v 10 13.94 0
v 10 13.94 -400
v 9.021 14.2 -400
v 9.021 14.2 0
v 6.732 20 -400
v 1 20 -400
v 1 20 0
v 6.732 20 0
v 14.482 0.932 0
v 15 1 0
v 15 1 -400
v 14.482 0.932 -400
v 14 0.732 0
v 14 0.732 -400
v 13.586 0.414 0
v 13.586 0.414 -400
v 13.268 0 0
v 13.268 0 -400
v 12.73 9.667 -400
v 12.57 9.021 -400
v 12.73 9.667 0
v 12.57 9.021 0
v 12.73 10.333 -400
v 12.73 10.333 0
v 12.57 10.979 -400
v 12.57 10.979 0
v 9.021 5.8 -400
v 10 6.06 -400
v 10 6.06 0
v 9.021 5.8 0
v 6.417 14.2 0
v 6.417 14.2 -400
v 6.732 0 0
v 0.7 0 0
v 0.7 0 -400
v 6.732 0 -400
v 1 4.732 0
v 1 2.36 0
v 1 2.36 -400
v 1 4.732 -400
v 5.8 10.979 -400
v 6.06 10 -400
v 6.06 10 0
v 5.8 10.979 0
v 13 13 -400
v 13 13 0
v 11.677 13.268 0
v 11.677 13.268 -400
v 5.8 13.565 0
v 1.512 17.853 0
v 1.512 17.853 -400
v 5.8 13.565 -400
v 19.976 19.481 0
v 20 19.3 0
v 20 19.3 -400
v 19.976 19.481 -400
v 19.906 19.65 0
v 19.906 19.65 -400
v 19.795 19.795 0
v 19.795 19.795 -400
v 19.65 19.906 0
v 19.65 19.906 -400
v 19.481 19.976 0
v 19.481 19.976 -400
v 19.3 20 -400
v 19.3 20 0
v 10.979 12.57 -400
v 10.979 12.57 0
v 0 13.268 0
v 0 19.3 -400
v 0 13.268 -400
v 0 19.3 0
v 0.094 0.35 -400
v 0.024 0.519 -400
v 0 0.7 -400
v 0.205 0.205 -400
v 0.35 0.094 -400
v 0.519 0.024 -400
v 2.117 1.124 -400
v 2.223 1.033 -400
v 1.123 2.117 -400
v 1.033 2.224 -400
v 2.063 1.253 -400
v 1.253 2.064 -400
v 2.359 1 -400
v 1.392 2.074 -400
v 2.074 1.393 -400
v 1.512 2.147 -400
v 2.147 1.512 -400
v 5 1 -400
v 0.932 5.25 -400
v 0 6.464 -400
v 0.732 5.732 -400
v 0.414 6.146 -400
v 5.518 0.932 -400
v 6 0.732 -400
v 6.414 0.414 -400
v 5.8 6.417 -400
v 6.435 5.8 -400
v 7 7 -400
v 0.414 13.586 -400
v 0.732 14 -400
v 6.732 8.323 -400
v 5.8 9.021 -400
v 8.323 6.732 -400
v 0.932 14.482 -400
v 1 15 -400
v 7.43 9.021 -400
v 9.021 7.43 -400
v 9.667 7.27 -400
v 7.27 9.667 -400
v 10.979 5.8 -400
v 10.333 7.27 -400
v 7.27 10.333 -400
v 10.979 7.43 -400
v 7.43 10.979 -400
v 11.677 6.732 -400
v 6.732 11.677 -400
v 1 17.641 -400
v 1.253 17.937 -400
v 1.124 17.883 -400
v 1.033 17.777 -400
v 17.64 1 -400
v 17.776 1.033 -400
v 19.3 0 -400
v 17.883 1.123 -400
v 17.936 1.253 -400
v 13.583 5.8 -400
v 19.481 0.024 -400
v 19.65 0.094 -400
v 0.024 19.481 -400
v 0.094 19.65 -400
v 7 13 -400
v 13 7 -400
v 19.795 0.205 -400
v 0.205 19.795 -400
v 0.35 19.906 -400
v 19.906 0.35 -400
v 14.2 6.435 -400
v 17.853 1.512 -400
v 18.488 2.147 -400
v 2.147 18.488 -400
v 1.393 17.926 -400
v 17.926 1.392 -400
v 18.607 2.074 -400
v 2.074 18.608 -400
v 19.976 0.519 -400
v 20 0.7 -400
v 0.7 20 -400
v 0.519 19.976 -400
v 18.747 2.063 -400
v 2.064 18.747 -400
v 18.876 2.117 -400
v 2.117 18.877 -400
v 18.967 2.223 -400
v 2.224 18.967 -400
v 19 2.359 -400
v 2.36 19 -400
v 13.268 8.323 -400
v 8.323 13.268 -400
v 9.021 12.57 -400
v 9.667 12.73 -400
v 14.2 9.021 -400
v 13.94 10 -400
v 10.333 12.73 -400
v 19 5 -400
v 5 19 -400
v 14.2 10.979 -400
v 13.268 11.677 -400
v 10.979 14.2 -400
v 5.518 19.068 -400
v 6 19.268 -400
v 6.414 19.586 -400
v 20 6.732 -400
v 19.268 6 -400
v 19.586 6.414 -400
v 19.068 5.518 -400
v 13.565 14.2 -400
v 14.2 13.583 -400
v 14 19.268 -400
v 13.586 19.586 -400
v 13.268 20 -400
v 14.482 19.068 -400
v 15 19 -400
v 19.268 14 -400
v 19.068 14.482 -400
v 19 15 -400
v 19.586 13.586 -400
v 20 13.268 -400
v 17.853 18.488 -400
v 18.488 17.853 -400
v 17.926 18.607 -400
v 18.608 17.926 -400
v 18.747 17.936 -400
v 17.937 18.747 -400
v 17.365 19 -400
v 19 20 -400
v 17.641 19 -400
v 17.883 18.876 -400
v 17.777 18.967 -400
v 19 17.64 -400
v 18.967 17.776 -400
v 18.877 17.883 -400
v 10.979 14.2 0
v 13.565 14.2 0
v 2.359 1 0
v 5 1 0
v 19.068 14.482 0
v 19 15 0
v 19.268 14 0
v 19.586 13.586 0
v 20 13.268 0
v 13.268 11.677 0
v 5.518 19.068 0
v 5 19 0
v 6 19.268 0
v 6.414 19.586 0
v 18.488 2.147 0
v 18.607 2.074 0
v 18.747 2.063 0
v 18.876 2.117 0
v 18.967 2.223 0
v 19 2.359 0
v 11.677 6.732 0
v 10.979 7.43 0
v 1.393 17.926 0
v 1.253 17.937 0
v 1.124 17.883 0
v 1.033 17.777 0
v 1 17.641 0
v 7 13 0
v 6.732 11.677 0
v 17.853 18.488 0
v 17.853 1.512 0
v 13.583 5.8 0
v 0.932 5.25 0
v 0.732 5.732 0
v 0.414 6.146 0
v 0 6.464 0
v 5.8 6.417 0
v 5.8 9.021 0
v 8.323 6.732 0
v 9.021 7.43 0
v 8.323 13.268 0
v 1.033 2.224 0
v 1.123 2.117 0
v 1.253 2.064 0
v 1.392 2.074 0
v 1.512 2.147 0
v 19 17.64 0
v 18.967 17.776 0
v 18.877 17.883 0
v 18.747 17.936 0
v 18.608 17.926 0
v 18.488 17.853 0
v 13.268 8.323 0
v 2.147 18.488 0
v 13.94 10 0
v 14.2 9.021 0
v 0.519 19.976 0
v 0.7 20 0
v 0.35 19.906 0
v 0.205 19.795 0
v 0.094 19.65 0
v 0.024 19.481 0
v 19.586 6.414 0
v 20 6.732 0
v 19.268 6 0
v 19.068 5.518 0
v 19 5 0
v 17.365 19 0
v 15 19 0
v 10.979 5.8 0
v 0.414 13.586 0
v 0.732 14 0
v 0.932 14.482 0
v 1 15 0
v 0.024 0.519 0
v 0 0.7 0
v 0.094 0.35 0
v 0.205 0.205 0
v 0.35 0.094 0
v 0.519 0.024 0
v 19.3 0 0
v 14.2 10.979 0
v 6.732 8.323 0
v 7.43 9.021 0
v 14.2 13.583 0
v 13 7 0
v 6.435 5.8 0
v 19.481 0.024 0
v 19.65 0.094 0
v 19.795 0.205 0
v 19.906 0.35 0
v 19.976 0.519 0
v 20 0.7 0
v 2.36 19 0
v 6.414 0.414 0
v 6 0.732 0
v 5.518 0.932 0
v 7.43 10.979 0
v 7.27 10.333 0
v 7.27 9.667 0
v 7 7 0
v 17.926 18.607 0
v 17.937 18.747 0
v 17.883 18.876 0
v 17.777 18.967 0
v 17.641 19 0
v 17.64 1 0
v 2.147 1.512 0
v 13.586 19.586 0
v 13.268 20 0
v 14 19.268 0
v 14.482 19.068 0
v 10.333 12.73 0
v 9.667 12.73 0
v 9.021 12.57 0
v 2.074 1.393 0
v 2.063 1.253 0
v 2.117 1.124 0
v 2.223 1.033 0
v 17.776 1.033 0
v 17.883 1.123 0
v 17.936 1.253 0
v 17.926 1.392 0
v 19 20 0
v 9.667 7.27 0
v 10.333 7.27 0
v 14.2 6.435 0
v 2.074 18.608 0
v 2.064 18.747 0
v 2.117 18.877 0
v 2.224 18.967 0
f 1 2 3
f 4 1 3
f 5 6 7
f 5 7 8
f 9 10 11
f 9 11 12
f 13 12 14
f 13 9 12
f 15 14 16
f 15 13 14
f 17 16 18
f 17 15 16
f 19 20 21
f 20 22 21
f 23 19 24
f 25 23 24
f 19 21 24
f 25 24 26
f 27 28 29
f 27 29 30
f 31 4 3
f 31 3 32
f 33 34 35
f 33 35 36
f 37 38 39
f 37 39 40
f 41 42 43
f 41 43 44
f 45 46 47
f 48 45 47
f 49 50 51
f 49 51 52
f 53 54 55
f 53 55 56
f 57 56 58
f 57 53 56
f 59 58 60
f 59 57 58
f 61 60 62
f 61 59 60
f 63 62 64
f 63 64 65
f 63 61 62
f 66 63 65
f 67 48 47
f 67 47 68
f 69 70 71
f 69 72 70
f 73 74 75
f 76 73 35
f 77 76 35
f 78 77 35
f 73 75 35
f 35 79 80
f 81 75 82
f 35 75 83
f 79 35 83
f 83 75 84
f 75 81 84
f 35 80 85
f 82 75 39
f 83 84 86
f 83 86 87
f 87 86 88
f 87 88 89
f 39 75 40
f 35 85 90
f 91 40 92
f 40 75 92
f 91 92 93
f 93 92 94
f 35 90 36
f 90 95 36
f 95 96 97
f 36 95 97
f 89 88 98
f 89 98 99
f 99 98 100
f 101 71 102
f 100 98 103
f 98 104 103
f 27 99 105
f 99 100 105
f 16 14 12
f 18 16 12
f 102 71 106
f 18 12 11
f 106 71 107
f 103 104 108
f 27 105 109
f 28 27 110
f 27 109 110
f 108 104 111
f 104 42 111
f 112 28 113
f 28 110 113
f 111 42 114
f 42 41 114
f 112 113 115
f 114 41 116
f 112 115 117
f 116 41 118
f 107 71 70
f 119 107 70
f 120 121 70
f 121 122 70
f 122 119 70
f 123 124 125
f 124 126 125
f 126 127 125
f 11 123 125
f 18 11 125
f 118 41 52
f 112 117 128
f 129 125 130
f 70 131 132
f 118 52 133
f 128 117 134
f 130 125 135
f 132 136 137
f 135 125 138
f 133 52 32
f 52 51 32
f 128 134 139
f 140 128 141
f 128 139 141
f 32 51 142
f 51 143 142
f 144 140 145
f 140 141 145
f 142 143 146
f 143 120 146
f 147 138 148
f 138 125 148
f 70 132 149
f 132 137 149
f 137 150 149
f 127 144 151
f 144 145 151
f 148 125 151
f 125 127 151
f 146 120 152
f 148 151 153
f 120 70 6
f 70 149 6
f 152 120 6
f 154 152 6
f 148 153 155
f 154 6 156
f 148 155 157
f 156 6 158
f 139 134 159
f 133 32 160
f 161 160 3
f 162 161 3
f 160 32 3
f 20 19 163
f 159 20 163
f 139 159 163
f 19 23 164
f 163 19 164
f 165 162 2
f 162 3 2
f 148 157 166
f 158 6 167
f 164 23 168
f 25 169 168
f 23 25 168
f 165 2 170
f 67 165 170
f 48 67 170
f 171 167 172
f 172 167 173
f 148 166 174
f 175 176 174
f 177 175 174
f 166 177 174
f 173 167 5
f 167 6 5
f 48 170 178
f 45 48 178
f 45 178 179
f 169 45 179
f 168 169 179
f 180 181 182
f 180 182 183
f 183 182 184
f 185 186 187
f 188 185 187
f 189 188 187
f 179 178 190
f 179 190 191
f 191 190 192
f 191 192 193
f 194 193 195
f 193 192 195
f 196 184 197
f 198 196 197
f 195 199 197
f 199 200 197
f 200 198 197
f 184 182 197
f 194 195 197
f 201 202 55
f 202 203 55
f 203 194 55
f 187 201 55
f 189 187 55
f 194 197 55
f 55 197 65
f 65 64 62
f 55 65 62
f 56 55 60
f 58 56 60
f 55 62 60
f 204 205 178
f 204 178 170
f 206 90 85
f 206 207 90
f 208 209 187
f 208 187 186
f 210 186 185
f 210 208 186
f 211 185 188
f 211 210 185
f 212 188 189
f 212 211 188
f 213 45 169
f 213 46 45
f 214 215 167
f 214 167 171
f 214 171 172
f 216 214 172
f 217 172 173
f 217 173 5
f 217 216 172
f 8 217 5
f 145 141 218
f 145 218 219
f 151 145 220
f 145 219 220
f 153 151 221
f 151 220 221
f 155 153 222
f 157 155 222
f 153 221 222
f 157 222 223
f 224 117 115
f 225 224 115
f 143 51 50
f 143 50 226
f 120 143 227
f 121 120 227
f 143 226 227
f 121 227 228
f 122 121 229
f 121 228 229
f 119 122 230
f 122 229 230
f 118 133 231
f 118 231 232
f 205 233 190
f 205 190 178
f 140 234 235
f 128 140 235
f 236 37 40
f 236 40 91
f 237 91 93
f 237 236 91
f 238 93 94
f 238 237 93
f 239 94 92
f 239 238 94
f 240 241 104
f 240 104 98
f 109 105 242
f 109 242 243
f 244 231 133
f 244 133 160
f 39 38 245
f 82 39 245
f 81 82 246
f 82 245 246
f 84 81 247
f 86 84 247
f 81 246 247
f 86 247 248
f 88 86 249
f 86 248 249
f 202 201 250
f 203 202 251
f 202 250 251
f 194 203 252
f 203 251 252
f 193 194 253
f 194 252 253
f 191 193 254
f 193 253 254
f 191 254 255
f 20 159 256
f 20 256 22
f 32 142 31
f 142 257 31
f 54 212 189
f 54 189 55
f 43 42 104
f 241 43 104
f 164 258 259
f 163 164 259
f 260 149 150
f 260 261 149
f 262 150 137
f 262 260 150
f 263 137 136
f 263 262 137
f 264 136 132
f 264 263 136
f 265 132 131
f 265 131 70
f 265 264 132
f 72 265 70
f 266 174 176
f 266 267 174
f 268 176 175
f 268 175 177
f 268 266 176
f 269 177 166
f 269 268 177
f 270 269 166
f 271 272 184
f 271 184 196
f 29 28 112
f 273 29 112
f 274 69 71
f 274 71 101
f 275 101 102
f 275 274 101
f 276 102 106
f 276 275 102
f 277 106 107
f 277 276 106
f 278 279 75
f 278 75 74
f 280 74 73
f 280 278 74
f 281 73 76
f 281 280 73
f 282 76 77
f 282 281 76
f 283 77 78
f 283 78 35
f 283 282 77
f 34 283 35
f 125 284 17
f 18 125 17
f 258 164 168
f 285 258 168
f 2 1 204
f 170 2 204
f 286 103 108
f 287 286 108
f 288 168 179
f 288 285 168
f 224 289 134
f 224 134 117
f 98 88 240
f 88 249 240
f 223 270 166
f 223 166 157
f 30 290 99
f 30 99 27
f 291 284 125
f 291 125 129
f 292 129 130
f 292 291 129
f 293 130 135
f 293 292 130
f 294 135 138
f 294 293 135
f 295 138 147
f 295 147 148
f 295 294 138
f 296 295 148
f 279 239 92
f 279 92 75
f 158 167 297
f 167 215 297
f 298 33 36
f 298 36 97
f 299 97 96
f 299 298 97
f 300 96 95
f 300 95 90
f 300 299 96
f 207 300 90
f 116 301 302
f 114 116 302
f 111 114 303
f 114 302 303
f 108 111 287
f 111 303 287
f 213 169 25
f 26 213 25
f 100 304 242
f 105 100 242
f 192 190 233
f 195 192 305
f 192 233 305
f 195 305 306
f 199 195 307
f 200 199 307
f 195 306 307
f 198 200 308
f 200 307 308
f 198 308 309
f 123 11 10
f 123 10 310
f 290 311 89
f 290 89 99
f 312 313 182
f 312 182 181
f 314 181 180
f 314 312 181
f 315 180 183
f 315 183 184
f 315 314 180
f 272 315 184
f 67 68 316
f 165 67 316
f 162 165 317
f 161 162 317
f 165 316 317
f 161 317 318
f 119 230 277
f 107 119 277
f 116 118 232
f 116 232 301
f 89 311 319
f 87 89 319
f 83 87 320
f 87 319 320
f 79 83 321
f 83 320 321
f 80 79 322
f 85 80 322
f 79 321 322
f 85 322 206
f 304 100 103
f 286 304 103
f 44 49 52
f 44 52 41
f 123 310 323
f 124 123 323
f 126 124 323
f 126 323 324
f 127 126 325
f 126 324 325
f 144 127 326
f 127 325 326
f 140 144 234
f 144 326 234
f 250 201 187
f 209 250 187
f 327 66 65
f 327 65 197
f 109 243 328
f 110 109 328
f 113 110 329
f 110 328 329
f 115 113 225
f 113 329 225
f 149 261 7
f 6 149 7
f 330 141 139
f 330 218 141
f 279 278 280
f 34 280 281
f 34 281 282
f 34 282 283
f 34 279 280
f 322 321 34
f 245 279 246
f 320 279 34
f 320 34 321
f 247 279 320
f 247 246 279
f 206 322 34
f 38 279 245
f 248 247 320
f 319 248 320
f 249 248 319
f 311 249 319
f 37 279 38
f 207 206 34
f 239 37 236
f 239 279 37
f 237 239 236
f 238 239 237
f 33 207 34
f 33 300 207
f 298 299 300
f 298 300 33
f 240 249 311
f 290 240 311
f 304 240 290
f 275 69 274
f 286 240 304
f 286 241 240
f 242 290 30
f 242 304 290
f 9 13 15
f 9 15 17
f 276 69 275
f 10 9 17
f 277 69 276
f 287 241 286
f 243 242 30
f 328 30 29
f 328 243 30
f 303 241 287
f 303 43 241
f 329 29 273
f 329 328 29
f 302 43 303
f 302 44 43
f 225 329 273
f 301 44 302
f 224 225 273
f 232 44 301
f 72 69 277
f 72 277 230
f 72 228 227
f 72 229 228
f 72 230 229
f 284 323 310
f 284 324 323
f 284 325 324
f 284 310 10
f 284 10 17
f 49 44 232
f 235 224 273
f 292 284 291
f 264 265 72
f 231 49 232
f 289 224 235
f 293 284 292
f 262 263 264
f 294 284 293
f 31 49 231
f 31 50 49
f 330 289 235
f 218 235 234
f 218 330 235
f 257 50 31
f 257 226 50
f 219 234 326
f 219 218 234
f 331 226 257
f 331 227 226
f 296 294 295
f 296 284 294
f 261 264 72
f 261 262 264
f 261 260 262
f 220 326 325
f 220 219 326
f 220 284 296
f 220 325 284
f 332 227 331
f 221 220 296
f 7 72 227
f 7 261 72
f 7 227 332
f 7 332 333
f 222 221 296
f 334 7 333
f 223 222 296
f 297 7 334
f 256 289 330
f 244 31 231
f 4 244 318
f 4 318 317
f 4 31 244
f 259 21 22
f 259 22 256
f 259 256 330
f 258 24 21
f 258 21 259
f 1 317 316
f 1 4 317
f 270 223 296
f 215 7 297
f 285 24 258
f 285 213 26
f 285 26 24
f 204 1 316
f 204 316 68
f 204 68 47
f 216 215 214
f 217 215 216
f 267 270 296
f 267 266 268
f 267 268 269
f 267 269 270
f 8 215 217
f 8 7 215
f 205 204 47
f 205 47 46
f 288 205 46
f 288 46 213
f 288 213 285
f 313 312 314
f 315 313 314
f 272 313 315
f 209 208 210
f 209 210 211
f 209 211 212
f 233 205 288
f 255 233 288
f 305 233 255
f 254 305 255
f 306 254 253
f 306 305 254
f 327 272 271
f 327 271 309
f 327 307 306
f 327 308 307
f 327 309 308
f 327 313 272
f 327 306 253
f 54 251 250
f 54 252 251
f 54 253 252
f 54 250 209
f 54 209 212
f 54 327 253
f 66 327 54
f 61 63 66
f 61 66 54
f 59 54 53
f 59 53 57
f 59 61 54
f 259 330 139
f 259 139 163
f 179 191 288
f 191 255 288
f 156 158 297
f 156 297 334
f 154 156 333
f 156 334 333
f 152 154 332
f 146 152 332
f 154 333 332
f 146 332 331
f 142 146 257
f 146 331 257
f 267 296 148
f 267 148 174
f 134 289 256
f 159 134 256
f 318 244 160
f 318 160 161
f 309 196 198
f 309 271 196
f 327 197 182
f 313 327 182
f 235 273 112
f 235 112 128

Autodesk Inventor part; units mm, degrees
ref_plane "YZ Plane" through (0, 0, 0) normal (1, 0, 0) x (0, 1, 0)
ref_plane "XZ Plane" through (0, 0, 0) normal (0, 1, 0) x (-1, 0, 0)
ref_plane "XY Plane" through (0, 0, 0) normal (0, 0, 1) x (1, 0, 0)
sketch "Boceto1" plane through (0, 0, 0) normal (0, 0, 1) x (1, 0, 0)
  line L0 (0, 20) -> (7, 20)
  line L1 (7, 20) -> (7, 21)
  line L2 (0, 20) -> (1, 20)
  line L3 (1, 17.6407) -> (1, 15)
  line L4 (-1, 13) -> (0, 13)
  line L5 (5, 19) -> (2.3598, 19)
  arc A0 (5, 19) -> (6.7321, 20) centre (5, 21) ccw
  arc A1 (0, 13.2679) -> (1, 15) centre (-1, 15) ccw
  line L6 (20, 20) -> (13, 20)
  line L7 (19.3, 20) -> (19, 20)
  line L8 (19, 17.6402) -> (19, 15)
  line L9 (21, 13) -> (20, 13)
  line L10 (13, 20) -> (13, 21)
  line L11 (15, 19) -> (18.365, 19)
  arc A2 (13.2679, 20) -> (15, 19) centre (15, 21) ccw
  arc A3 (19, 15) -> (20, 13.2679) centre (21, 15) ccw
  line L12 (0.7, 0) -> (7, 0)
  line L13 (-1, 8.6378) -> (0, 8.6378)
  line L14 (7, 0) -> (7, -1)
  line L15 (5, 1) -> (2.3593, 1)
  line L16 (19.3, 0) -> (13, 0)
  line L17 (13, 0) -> (13, -1)
  line L18 (15, 1) -> (17.6402, 1)
  line L19 (19, 5) -> (19, 2.3593)
  arc A4 (20, 6.7321) -> (19, 5) centre (21, 5) ccw
  arc A5 (15, 1) -> (13.2679, 0) centre (15, -1) ccw
  arc A6 (6.7321, 0) -> (5, 1) centre (5, -1) ccw
  line L20 (20, 20) -> (13, 20)
  line L21 (7, 20) -> (0.7, 20)
  line L22 (0, 19.3) -> (0, 13)
  line L23 (0, 6.4641) -> (0, 0.7)
  line L24 (20, 0.7) -> (20, 6.7321)
  line L25 (20, 13) -> (20, 19.3)
  line L26 (0, 0) -> (7, 0)
  line L27 (13, 0) -> (20, 0)
  line L28 (17.6407, 19) -> (17.365, 19)
  line L29 (17.8529, 18.4879) -> (13.565, 14.2)
  line L30 (18.4883, 17.8528) -> (14.2, 13.5832)
  line L31 (1.5121, 17.8529) -> (5.8, 13.565)
  line L32 (2.1472, 18.4883) -> (6.4168, 14.2)
  line L33 (2.1471, 1.5121) -> (6.435, 5.8)
  line L34 (1.5117, 2.1472) -> (5.8, 6.4168)
  line L35 (18.4879, 2.1471) -> (14.2, 6.435)
  line L36 (17.8528, 1.5117) -> (13.5832, 5.8)
  line L37 (13, 13) -> (11.6766, 13.2679)
  line L38 (11.6766, 13.2679) -> (10.9786, 12.57)
  line L39 (13, 13) -> (13.2679, 11.6766)
  line L40 (13.2679, 11.6766) -> (12.57, 10.9786)
  line L41 (6.7321, 11.6766) -> (7.43, 10.9786)
  line L42 (7, 13) -> (6.7321, 11.6766)
  line L43 (7, 13) -> (8.3234, 13.2679)
  line L44 (8.3234, 13.2679) -> (9.0214, 12.57)
  line L45 (8.3234, 6.7321) -> (9.0214, 7.43)
  line L46 (7, 7) -> (8.3234, 6.7321)
  line L47 (7, 7) -> (6.7321, 8.3234)
  line L48 (6.7321, 8.3234) -> (7.43, 9.0214)
  line L49 (13.2679, 8.3234) -> (12.57, 9.0214)
  line L50 (13, 7) -> (13.2679, 8.3234)
  line L51 (13, 7) -> (11.6766, 6.7321)
  line L52 (11.6766, 6.7321) -> (10.9786, 7.43)
  line L53 (7, 13) -> (5.8, 14.2) construction
  line L54 (5.8, 5.8) -> (7, 7) construction
  line L55 (14.2, 5.8) -> (13, 7) construction
  line L56 (11.9445, 8.0555) -> (8.0555, 11.9445) construction
  line L57 (8.0555, 8.0555) -> (11.9445, 11.9445) construction
  line L58 (13, 13) -> (14.2, 14.2) construction
  arc A7 (10.9786, 12.57) -> (9.0214, 12.57) centre (10, 10) ccw
  arc A8 (12.57, 9.0214) -> (12.57, 10.9786) centre (10, 10) ccw
  arc A9 (7.43, 10.9786) -> (7.43, 9.0214) centre (10, 10) ccw
  arc A10 (9.0214, 7.43) -> (10.9786, 7.43) centre (10, 10) ccw
  line L59 (13.94, 10) -> (14.2, 10.9786)
  line L60 (13.94, 10) -> (14.2, 9.0214)
  line L61 (14.2, 6.435) -> (14.2, 9.0214)
  line L62 (14.2, 10.9786) -> (14.2, 13.5832)
  line L63 (10, 13.94) -> (10.9786, 14.2)
  line L64 (10.9786, 14.2) -> (10, 13.94)
  line L65 (10, 13.94) -> (9.0214, 14.2)
  line L66 (6.06, 10) -> (5.8, 10.9786)
  line L67 (6.06, 10) -> (5.8, 9.0214)
  line L68 (10, 6.06) -> (10.9786, 5.8)
  line L69 (10, 6.06) -> (9.0214, 5.8)
  line L70 (6.435, 5.8) -> (9.0214, 5.8)
  line L71 (10.9786, 5.8) -> (13.5832, 5.8)
  line L72 (5.8, 13.565) -> (5.8, 10.9786)
  line L73 (5.8, 9.0214) -> (5.8, 6.4168)
  line L74 (13.565, 14.2) -> (10.9786, 14.2)
  line L75 (9.0214, 14.2) -> (6.4168, 14.2)
  line L76 (1, 2.3598) -> (1, 4.7321)
  arc A11 (1, 4.7321) -> (0, 6.4641) centre (-1, 4.7321) ccw
  arc A12 (0.7, 20) -> (0, 19.3) centre (0.7, 19.3) ccw
  arc A13 (20, 19.3) -> (19.3, 20) centre (19.3, 19.3) ccw
  arc A14 (19.3, 0) -> (20, 0.7) centre (19.3, 0.7) ccw
  arc A15 (0, 0.7) -> (0.7, 0) centre (0.7, 0.7) ccw
  arc A16 (2.3598, 19) -> (2.1472, 18.4883) centre (2.3598, 18.7) ccw
  arc A17 (1.5121, 17.8529) -> (1, 17.6407) centre (1.3, 17.6407) ccw
  arc A18 (17.8529, 18.4879) -> (17.6407, 19) centre (17.6407, 18.7) ccw
  arc A19 (19, 17.6402) -> (18.4883, 17.8528) centre (18.7, 17.6402) ccw
  arc A20 (18.4879, 2.1471) -> (19, 2.3593) centre (18.7, 2.3593) ccw
  arc A21 (17.6402, 1) -> (17.8528, 1.5117) centre (17.6402, 1.3) ccw
  arc A22 (2.1471, 1.5121) -> (2.3593, 1) centre (2.3593, 1.3) ccw
  arc A23 (1, 2.3598) -> (1.5117, 2.1472) centre (1.3, 2.3598) ccw
  point P0 (7, 19)
  point P1 (1, 13)
  point P2 (19, 13)
  point P3 (1, 1.6378)
  point P4 (1, 8.6378)
  point P5 (7, 1)
  point P6 (13, 1)
  point P7 (19, 1.635)
  point P8 (1, 18.365)
  point P9 (19, 18.3622)
  point P10 (19.6406, 19)
  point P11 (1, 19.6406)
  point P12 (0.3594, 1)
  point P13 (19, 0.3594)
  point P14 (1.6378, 19)
  point P15 (1.635, 1)
  point P16 (18.3622, 1)
  dimension "d1" = 20
  dimension "d2" = 20
  dimension "d5" = 7
  dimension "d6" = 1
  dimension "d7" = 1
  dimension "d8" = 7
  dimension "d9" = 2
  dimension "d10" = 2
  dimension "d11" = 7
  dimension "d12" = 1
  dimension "d13" = 7
  dimension "d14" = 2
  dimension "d15" = 7
  dimension "d16" = 1
  dimension "d17" = 7
  dimension "d20" = 8.4
  dimension "d21" = 8.4
  dimension "d23" = 0.9
  dimension "d26" = 360
  dimension "d30" = 360
  dimension "d38" = 2
  dimension "d41" = 0.7
  dimension "d42" = 0.3
extrude "Extrusión3" add sketch "Boceto1" against normal blind 400
properties part number "PerfilBaseJohan"
